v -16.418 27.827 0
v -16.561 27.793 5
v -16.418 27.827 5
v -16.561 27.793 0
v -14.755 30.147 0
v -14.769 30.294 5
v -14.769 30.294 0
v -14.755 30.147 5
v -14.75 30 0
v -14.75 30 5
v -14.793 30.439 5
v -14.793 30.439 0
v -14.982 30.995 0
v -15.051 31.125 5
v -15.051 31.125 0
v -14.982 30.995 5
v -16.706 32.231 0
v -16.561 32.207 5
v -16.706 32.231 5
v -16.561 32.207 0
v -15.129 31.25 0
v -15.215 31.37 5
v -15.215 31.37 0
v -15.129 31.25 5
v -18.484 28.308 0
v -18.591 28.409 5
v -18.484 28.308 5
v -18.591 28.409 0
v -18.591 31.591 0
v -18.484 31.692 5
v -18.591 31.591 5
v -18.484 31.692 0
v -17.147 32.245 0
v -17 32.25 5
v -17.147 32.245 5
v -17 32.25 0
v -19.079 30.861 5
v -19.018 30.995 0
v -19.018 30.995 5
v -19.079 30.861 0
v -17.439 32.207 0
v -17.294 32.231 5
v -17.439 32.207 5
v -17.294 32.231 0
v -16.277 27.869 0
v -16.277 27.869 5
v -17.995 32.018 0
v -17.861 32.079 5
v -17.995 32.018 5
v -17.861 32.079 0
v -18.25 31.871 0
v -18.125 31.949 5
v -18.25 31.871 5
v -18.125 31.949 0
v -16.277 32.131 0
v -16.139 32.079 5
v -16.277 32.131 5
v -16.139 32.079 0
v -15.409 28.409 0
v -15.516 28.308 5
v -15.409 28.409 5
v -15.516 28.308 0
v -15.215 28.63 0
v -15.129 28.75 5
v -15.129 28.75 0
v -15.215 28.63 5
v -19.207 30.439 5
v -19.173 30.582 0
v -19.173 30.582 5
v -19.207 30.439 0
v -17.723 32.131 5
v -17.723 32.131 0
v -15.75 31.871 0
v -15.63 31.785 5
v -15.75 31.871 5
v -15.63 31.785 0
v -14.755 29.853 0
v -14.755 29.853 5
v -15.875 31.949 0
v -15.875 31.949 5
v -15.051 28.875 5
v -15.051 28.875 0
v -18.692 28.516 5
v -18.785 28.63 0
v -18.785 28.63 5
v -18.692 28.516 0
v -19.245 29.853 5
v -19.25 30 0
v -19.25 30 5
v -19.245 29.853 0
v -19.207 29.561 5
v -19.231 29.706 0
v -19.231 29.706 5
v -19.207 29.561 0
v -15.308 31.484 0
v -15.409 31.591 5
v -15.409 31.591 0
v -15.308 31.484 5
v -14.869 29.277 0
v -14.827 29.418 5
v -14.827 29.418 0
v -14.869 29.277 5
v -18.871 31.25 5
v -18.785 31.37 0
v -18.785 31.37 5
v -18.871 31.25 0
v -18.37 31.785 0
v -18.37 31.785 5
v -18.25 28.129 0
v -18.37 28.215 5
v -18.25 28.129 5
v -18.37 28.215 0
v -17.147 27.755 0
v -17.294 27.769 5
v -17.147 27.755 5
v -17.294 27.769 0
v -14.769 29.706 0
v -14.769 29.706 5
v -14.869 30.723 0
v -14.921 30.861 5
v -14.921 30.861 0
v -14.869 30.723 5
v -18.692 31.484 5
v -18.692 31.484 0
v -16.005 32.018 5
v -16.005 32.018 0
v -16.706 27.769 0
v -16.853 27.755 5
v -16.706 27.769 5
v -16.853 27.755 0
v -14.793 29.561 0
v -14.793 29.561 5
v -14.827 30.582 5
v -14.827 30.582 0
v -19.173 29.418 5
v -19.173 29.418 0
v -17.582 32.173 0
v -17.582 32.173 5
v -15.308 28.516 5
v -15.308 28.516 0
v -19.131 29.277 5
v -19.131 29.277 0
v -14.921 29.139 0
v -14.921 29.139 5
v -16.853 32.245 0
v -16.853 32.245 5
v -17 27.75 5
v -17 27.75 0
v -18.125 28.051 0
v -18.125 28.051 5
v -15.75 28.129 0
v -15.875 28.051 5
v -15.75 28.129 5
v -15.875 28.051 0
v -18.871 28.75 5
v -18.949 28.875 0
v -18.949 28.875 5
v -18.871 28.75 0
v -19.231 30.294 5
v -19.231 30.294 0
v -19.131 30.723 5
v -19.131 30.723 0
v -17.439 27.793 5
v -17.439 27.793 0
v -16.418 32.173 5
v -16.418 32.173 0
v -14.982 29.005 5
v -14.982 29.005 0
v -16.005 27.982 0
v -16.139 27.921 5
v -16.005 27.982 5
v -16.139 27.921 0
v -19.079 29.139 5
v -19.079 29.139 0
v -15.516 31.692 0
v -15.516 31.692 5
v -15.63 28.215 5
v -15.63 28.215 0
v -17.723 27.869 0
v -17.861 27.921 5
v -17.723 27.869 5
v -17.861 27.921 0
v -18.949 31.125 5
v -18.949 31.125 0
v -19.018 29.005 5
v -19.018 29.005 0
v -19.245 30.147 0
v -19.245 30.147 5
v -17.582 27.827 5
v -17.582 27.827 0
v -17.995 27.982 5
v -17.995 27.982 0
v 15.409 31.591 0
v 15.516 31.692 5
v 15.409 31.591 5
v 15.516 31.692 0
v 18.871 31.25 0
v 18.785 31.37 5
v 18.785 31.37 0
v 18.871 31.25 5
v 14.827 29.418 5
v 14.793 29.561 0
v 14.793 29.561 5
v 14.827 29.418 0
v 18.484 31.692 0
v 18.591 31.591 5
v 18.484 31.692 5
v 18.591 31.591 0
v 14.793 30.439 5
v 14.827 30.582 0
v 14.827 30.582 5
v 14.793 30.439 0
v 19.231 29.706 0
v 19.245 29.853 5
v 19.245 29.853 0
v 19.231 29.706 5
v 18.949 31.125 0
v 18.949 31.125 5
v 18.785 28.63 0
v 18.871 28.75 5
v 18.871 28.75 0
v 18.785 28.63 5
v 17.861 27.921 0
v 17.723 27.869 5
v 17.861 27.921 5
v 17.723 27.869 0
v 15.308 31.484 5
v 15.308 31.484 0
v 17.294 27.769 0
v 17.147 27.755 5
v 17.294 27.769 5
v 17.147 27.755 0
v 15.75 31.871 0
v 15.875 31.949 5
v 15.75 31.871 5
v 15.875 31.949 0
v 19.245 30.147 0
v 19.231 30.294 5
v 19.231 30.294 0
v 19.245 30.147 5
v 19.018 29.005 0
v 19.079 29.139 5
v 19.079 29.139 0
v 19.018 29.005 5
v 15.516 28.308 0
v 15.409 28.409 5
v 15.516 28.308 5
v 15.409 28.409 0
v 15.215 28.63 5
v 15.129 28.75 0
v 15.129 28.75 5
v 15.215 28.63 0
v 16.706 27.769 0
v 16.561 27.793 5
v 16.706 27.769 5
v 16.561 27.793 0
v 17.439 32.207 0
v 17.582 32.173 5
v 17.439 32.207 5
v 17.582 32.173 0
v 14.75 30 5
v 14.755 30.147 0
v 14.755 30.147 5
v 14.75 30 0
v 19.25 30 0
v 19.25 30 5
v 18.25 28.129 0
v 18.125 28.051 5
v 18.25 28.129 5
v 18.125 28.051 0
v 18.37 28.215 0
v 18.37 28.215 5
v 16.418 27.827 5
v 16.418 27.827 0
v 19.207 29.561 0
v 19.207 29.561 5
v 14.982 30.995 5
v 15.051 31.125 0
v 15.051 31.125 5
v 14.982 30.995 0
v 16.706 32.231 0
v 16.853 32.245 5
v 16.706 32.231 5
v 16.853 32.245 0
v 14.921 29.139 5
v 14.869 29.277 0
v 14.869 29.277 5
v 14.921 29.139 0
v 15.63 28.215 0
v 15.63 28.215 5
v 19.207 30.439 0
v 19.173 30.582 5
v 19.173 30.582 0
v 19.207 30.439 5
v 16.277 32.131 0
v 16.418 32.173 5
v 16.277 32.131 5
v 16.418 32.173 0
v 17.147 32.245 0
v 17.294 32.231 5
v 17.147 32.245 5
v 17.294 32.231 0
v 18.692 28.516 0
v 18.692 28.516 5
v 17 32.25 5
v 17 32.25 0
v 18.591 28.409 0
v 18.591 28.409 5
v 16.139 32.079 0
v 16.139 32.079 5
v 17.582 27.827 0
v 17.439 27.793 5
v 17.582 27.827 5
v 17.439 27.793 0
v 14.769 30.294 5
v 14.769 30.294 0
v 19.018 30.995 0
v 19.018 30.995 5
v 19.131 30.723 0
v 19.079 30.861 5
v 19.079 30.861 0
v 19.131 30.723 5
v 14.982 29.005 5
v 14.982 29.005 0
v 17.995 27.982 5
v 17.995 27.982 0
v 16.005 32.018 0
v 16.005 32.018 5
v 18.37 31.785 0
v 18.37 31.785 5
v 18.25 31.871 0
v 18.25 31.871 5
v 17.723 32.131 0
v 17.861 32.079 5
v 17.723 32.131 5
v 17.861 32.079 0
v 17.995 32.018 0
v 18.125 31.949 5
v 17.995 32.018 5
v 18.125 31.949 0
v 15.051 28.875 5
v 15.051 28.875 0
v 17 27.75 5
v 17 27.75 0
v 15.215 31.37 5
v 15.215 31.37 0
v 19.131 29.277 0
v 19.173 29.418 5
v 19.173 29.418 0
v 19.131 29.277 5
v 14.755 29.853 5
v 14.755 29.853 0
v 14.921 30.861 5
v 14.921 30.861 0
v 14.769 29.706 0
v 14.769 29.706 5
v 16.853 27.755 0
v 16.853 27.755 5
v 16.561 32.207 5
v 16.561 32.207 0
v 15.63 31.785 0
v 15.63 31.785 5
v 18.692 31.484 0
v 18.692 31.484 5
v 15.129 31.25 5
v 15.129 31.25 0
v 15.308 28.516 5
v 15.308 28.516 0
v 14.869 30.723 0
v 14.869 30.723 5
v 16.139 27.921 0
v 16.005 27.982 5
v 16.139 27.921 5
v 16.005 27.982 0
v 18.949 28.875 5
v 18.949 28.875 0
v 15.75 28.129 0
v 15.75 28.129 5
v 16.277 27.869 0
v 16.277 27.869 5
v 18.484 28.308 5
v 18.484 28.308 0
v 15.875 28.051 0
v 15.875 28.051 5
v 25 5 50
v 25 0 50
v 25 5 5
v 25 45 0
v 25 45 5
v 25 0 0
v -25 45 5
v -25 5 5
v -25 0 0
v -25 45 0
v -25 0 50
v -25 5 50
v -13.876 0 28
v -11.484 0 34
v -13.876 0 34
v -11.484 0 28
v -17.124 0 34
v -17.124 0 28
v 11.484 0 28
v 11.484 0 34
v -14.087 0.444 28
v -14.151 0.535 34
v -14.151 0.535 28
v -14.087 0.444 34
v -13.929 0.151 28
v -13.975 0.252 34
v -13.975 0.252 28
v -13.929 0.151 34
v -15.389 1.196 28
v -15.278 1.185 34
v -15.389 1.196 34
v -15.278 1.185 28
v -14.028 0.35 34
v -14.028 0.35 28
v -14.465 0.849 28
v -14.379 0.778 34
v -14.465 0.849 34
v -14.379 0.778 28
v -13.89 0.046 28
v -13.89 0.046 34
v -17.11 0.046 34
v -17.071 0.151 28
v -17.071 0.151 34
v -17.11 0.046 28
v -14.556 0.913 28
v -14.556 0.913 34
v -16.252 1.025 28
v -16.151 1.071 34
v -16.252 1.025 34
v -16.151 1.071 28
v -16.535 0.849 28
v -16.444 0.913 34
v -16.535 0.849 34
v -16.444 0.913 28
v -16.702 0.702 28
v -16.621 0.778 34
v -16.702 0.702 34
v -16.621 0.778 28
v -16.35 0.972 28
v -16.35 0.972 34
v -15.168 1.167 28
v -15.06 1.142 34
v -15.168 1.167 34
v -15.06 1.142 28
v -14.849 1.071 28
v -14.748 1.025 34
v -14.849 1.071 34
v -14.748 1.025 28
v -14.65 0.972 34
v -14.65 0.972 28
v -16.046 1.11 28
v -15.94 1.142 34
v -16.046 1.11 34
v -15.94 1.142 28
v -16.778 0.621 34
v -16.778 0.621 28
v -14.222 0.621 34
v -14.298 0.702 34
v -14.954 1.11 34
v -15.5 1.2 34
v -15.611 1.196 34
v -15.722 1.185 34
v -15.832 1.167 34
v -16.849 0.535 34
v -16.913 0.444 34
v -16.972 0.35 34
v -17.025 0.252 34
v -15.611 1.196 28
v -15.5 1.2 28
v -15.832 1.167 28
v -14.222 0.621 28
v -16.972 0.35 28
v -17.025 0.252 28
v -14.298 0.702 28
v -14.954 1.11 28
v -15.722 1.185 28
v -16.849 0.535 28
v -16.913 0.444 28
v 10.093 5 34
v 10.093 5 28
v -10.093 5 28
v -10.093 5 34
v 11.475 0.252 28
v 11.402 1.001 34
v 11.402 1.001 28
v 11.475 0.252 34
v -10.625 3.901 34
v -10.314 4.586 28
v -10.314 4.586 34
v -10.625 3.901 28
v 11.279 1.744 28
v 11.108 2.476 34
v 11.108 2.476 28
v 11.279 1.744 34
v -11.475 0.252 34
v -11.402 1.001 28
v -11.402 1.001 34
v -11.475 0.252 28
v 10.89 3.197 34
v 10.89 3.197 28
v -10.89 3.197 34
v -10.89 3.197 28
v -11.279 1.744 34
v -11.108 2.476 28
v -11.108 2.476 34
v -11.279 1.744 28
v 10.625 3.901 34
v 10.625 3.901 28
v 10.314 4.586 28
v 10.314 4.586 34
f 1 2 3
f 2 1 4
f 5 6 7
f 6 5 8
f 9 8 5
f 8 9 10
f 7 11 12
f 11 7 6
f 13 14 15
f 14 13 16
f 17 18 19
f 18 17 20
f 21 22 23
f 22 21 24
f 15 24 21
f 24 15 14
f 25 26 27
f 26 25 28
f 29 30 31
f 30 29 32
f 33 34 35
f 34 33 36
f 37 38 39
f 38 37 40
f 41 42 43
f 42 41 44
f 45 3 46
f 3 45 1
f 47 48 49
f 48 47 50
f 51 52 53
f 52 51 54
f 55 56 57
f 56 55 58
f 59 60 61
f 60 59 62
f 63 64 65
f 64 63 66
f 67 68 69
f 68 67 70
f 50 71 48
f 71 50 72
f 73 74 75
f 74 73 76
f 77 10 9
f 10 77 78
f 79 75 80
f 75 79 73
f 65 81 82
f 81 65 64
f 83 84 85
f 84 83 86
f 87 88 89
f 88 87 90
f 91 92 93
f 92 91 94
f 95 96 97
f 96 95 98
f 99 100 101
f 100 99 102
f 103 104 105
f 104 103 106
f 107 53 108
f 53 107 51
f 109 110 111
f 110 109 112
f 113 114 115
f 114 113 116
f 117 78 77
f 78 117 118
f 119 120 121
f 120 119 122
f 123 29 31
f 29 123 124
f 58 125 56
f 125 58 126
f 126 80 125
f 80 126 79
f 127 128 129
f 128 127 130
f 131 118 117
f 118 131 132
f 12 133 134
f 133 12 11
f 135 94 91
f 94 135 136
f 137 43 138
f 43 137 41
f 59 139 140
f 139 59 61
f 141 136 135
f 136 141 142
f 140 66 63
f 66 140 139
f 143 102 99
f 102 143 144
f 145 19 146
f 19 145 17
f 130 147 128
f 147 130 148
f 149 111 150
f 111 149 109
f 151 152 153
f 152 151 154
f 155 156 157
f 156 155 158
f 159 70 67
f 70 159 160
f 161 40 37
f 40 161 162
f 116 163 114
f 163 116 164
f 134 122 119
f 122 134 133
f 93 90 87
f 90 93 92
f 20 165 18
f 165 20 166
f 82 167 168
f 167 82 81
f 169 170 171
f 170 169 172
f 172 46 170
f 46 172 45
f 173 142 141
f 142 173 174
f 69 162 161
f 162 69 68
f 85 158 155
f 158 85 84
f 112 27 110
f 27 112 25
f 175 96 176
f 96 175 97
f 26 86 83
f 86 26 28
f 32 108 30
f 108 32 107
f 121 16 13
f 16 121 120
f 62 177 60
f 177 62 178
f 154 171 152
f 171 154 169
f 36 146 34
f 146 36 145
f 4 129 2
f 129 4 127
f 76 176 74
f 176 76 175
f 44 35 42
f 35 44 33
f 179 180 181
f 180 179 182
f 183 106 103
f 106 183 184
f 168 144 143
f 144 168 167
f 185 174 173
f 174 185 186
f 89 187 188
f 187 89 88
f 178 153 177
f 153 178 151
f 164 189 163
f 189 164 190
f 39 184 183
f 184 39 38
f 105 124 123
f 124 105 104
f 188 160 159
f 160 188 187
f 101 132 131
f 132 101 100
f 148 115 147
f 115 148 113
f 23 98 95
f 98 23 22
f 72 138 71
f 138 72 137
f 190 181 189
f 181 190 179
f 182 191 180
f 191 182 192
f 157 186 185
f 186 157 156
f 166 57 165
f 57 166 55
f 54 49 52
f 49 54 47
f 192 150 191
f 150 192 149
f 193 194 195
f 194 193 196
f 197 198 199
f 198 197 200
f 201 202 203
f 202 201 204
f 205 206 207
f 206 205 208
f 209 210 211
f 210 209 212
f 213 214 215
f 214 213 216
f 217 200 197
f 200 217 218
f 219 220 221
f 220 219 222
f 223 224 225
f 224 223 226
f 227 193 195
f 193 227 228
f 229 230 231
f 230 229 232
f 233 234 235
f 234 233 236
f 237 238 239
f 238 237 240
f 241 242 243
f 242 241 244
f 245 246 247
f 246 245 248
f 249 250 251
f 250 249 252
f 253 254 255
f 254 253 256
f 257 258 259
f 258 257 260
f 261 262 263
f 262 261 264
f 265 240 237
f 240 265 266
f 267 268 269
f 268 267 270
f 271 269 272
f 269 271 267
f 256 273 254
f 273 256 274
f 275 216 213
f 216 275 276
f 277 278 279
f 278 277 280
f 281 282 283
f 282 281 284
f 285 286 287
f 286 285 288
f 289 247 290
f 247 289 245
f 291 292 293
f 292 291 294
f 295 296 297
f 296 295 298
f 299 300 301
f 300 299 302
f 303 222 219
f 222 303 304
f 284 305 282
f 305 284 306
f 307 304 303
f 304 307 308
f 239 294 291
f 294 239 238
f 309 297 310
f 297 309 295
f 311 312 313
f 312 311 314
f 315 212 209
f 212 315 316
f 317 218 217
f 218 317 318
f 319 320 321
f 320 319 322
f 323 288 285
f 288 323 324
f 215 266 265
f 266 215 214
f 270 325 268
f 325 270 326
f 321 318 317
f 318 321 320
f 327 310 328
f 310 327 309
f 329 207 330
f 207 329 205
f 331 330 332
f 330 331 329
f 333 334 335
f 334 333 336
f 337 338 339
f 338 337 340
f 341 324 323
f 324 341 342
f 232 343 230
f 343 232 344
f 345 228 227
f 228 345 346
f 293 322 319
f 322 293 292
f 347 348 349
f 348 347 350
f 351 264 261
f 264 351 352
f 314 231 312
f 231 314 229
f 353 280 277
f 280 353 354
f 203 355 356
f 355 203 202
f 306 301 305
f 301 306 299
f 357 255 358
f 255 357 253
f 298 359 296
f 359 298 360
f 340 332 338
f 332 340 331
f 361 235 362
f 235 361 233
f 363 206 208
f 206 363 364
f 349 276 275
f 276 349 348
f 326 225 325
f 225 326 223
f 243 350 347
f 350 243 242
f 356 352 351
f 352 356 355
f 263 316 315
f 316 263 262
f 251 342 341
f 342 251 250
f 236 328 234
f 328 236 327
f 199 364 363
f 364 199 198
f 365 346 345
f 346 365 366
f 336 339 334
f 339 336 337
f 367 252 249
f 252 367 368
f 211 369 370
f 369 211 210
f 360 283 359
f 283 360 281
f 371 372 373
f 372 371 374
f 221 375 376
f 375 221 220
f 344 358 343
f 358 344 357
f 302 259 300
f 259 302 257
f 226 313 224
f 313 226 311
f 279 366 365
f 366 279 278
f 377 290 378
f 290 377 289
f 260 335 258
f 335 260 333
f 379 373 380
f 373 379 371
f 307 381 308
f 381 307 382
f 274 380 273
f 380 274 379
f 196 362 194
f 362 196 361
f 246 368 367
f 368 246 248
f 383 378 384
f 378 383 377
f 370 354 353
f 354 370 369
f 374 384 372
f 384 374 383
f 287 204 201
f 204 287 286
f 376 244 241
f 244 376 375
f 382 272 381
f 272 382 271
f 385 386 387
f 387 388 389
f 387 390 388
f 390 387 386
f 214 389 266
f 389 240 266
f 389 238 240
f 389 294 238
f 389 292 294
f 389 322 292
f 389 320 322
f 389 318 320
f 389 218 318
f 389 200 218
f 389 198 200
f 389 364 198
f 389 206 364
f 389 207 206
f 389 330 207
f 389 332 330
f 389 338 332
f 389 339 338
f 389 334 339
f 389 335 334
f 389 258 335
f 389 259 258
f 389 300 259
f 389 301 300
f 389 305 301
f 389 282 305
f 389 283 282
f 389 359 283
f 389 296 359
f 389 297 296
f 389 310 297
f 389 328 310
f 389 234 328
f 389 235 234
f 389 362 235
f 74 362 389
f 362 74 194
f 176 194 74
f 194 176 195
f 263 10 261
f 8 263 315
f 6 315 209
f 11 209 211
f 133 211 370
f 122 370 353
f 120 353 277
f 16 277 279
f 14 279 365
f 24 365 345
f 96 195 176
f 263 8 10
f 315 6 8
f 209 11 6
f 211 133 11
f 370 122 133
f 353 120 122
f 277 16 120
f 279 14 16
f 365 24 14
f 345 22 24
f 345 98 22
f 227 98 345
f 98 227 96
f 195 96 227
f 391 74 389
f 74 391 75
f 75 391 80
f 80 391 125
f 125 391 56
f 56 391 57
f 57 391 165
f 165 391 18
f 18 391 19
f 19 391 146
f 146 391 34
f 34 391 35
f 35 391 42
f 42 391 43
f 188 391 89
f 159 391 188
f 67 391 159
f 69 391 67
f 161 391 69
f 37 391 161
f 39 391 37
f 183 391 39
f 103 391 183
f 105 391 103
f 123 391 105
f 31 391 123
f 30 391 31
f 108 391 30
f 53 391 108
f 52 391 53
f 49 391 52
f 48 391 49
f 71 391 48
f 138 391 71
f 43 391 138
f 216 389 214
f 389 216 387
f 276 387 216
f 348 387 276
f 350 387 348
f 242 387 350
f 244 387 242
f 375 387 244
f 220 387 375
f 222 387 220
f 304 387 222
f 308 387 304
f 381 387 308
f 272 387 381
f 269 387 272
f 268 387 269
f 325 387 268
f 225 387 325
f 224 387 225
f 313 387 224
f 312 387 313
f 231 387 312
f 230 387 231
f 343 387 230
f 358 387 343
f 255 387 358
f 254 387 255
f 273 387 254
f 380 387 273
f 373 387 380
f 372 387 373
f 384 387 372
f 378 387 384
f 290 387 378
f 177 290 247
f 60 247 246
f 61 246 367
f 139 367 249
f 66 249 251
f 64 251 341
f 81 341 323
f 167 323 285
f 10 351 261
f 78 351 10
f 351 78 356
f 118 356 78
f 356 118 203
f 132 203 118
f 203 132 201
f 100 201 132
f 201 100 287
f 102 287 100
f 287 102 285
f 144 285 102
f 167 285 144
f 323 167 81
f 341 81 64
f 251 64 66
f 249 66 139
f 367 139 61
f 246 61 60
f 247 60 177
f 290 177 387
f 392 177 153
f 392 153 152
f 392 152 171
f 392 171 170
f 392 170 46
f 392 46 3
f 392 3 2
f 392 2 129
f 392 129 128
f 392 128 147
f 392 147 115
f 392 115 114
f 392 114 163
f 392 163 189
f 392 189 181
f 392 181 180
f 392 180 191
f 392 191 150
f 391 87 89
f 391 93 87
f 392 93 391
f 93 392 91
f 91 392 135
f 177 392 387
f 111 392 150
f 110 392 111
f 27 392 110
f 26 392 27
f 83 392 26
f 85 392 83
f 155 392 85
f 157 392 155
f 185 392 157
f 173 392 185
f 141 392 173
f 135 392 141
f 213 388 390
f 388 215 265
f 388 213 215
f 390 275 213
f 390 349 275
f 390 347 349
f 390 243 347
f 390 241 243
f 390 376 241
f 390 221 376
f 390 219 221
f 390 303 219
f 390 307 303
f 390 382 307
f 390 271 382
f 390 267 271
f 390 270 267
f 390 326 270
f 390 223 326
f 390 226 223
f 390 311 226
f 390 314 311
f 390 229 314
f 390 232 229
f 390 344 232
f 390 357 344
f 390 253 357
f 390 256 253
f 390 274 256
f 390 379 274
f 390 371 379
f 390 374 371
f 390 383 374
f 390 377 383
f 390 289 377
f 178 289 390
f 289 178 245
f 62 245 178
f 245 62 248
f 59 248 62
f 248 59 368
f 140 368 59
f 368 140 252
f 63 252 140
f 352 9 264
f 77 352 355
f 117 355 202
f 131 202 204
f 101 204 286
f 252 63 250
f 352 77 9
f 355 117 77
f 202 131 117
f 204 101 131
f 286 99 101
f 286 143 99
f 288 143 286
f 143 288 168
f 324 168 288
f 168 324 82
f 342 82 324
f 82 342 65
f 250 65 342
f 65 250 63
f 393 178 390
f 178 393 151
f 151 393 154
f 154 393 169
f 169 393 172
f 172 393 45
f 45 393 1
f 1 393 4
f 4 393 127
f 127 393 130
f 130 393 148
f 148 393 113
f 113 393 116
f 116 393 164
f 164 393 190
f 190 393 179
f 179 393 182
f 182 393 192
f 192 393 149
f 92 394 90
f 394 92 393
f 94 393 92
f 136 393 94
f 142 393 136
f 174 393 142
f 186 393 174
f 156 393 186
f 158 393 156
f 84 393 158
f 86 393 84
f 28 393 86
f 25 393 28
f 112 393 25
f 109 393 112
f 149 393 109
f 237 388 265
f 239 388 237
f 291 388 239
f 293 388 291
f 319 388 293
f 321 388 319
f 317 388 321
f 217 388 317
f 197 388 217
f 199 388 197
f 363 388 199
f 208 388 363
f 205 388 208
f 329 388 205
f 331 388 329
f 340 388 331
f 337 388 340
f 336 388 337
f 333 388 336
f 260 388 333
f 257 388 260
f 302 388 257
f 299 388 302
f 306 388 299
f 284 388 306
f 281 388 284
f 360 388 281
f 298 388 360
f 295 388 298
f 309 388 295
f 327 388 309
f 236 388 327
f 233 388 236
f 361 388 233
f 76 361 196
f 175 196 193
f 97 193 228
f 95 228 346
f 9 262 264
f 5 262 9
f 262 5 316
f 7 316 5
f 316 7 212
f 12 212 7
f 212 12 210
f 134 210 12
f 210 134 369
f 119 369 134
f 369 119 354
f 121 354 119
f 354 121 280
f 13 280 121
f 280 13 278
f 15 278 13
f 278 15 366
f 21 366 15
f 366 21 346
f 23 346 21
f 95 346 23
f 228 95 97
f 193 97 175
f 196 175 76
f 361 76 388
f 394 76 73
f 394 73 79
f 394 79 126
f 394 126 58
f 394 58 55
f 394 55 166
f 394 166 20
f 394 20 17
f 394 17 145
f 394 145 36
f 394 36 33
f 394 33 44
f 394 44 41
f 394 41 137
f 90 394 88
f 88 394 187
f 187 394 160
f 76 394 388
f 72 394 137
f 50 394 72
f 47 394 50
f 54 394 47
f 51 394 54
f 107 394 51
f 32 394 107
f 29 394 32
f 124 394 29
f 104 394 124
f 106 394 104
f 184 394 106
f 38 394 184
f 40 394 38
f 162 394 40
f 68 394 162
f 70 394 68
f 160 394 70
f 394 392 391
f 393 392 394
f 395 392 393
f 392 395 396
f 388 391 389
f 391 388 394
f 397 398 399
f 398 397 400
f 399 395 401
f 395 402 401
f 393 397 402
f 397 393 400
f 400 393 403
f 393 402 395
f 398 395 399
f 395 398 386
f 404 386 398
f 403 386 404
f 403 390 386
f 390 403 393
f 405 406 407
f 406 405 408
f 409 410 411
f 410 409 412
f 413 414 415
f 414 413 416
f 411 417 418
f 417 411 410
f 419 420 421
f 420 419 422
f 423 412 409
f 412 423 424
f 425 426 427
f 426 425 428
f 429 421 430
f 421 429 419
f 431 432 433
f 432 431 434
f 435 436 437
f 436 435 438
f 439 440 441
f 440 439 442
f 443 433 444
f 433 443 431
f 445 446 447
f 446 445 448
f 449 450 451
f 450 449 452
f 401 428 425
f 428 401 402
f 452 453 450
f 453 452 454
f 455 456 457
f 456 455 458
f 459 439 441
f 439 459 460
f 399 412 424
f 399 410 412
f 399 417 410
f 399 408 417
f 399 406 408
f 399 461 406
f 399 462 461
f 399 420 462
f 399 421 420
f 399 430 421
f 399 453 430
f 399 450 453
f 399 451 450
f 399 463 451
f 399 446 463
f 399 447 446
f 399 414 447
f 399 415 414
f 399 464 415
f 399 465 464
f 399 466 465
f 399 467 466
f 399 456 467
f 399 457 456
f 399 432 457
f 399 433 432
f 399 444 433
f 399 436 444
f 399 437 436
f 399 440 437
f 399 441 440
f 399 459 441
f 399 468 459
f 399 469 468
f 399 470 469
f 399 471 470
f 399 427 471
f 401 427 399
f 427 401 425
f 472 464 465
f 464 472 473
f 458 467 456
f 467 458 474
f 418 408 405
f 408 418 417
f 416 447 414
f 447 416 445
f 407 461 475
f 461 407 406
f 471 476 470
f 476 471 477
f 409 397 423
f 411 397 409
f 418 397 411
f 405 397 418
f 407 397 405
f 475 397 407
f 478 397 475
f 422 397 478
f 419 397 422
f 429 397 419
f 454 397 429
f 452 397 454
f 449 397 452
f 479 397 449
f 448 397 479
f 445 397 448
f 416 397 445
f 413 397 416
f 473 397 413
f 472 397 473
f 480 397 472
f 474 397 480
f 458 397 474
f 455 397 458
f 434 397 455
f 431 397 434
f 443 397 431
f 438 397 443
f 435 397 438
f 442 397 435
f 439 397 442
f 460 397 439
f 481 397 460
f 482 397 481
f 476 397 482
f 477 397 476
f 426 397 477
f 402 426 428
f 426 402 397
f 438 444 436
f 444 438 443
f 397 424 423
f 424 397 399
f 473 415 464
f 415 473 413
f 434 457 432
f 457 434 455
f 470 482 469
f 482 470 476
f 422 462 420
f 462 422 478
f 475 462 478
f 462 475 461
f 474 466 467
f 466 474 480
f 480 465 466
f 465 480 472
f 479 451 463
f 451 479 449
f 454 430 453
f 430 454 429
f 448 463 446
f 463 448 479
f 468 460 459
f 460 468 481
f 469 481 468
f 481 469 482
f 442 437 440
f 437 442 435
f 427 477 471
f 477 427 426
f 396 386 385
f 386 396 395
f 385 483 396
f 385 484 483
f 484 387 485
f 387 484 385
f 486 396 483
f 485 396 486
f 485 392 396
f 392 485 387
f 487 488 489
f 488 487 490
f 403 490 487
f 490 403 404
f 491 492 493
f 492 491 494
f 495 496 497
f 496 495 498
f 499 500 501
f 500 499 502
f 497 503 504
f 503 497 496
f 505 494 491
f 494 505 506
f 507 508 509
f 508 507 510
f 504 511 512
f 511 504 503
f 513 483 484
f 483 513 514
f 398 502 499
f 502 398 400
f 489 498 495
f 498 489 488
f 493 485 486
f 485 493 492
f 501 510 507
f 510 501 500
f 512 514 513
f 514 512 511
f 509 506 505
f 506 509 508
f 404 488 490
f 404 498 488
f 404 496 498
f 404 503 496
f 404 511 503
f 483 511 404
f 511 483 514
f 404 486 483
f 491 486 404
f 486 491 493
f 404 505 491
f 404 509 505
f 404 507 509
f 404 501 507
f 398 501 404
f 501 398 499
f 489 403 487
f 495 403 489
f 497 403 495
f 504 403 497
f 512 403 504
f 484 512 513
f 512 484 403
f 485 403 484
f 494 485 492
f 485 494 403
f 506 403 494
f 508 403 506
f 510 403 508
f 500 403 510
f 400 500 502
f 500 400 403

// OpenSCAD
// L-shaped mounting bracket for NEMA 17 stepper motor (e.g. syringe pump)
// Print orientation: base plate on bed, vertical plate builds up in +Z

// ---------------- Parameters ----------------
base_x      = 25;     // base plate extends x = -base_x .. +base_x
base_y      = 45;     // base plate extends y = 0 .. base_y
base_t      = 5;      // base plate thickness (z)

hole_m4_x   = 17;     // M4 hole x offset from origin (holes at +/- x)
hole_m4_y   = 30;     // M4 hole y position
hole_m4_d   = 4.5;    // M4 hole diameter

motor_x     = 25;     // motor plate extends x = -motor_x .. +motor_x
motor_y     = 5;      // motor plate extends y = 0 .. motor_y
motor_h     = 50;     // motor plate height (z)

boss_d      = 23;     // motor centring boss hole diameter
boss_x      = 0;      // boss hole x centre
boss_z      = 28;     // boss hole z centre

screw_d     = 3.4;    // M3 screw hole diameter
screw_pitch = 31;     // square pattern side length
screw_n     = 4;      // number of screw holes

gusset_t    = 5;      // gusset thickness (x)
gusset_leg  = 20;     // right triangle legs along +Y and +Z
gusset_x0   = -25;    // left gusset x start
gusset_x1   = 20;     // right gusset x start

eps         = 0.5;    // cutter overshoot past faces

$fn = 96;

// ---------------- Model ----------------
union() {
    // Base plate with M4 through-holes
    difference() {
        translate([-base_x, 0, 0]) cube([2*base_x, base_y, base_t]);
        for (sx = [-1, 1])
            translate([sx*hole_m4_x, hole_m4_y, -eps])
                cylinder(d = hole_m4_d, h = base_t + 2*eps);
    }

    // Vertical motor plate with boss hole and M3 screw holes
    difference() {
        translate([-motor_x, 0, 0]) cube([2*motor_x, motor_y, motor_h]);
        translate([boss_x, -eps, boss_z])
            cylinder(d = boss_d, h = motor_y + 2*eps);
        for (i = [0:3]) {
            a = (i < 2) ? 0 : 90;
            translate([0, -eps, boss_z + (i < 2 ? 0 : motor_y - boss_z)])
                rotate([0, 0, a])
                    translate([-screw_pitch/2, 0, 0])
                        cylinder(d = screw_d, h = motor_y + 2*eps);
        }
    }

    // Triangular gussets flush with left and right edges
    for (sx = [-1, 1]) {
        x1 = sx == -1 ? gusset_x0 : gusset_x1;
        translate([x1, 5, 5])
            linear_extrude(gusset_t)
                translate([-gusset_leg, 0, 0])
                    cube([gusset_leg, gusset_leg, 1]);
    }
}
